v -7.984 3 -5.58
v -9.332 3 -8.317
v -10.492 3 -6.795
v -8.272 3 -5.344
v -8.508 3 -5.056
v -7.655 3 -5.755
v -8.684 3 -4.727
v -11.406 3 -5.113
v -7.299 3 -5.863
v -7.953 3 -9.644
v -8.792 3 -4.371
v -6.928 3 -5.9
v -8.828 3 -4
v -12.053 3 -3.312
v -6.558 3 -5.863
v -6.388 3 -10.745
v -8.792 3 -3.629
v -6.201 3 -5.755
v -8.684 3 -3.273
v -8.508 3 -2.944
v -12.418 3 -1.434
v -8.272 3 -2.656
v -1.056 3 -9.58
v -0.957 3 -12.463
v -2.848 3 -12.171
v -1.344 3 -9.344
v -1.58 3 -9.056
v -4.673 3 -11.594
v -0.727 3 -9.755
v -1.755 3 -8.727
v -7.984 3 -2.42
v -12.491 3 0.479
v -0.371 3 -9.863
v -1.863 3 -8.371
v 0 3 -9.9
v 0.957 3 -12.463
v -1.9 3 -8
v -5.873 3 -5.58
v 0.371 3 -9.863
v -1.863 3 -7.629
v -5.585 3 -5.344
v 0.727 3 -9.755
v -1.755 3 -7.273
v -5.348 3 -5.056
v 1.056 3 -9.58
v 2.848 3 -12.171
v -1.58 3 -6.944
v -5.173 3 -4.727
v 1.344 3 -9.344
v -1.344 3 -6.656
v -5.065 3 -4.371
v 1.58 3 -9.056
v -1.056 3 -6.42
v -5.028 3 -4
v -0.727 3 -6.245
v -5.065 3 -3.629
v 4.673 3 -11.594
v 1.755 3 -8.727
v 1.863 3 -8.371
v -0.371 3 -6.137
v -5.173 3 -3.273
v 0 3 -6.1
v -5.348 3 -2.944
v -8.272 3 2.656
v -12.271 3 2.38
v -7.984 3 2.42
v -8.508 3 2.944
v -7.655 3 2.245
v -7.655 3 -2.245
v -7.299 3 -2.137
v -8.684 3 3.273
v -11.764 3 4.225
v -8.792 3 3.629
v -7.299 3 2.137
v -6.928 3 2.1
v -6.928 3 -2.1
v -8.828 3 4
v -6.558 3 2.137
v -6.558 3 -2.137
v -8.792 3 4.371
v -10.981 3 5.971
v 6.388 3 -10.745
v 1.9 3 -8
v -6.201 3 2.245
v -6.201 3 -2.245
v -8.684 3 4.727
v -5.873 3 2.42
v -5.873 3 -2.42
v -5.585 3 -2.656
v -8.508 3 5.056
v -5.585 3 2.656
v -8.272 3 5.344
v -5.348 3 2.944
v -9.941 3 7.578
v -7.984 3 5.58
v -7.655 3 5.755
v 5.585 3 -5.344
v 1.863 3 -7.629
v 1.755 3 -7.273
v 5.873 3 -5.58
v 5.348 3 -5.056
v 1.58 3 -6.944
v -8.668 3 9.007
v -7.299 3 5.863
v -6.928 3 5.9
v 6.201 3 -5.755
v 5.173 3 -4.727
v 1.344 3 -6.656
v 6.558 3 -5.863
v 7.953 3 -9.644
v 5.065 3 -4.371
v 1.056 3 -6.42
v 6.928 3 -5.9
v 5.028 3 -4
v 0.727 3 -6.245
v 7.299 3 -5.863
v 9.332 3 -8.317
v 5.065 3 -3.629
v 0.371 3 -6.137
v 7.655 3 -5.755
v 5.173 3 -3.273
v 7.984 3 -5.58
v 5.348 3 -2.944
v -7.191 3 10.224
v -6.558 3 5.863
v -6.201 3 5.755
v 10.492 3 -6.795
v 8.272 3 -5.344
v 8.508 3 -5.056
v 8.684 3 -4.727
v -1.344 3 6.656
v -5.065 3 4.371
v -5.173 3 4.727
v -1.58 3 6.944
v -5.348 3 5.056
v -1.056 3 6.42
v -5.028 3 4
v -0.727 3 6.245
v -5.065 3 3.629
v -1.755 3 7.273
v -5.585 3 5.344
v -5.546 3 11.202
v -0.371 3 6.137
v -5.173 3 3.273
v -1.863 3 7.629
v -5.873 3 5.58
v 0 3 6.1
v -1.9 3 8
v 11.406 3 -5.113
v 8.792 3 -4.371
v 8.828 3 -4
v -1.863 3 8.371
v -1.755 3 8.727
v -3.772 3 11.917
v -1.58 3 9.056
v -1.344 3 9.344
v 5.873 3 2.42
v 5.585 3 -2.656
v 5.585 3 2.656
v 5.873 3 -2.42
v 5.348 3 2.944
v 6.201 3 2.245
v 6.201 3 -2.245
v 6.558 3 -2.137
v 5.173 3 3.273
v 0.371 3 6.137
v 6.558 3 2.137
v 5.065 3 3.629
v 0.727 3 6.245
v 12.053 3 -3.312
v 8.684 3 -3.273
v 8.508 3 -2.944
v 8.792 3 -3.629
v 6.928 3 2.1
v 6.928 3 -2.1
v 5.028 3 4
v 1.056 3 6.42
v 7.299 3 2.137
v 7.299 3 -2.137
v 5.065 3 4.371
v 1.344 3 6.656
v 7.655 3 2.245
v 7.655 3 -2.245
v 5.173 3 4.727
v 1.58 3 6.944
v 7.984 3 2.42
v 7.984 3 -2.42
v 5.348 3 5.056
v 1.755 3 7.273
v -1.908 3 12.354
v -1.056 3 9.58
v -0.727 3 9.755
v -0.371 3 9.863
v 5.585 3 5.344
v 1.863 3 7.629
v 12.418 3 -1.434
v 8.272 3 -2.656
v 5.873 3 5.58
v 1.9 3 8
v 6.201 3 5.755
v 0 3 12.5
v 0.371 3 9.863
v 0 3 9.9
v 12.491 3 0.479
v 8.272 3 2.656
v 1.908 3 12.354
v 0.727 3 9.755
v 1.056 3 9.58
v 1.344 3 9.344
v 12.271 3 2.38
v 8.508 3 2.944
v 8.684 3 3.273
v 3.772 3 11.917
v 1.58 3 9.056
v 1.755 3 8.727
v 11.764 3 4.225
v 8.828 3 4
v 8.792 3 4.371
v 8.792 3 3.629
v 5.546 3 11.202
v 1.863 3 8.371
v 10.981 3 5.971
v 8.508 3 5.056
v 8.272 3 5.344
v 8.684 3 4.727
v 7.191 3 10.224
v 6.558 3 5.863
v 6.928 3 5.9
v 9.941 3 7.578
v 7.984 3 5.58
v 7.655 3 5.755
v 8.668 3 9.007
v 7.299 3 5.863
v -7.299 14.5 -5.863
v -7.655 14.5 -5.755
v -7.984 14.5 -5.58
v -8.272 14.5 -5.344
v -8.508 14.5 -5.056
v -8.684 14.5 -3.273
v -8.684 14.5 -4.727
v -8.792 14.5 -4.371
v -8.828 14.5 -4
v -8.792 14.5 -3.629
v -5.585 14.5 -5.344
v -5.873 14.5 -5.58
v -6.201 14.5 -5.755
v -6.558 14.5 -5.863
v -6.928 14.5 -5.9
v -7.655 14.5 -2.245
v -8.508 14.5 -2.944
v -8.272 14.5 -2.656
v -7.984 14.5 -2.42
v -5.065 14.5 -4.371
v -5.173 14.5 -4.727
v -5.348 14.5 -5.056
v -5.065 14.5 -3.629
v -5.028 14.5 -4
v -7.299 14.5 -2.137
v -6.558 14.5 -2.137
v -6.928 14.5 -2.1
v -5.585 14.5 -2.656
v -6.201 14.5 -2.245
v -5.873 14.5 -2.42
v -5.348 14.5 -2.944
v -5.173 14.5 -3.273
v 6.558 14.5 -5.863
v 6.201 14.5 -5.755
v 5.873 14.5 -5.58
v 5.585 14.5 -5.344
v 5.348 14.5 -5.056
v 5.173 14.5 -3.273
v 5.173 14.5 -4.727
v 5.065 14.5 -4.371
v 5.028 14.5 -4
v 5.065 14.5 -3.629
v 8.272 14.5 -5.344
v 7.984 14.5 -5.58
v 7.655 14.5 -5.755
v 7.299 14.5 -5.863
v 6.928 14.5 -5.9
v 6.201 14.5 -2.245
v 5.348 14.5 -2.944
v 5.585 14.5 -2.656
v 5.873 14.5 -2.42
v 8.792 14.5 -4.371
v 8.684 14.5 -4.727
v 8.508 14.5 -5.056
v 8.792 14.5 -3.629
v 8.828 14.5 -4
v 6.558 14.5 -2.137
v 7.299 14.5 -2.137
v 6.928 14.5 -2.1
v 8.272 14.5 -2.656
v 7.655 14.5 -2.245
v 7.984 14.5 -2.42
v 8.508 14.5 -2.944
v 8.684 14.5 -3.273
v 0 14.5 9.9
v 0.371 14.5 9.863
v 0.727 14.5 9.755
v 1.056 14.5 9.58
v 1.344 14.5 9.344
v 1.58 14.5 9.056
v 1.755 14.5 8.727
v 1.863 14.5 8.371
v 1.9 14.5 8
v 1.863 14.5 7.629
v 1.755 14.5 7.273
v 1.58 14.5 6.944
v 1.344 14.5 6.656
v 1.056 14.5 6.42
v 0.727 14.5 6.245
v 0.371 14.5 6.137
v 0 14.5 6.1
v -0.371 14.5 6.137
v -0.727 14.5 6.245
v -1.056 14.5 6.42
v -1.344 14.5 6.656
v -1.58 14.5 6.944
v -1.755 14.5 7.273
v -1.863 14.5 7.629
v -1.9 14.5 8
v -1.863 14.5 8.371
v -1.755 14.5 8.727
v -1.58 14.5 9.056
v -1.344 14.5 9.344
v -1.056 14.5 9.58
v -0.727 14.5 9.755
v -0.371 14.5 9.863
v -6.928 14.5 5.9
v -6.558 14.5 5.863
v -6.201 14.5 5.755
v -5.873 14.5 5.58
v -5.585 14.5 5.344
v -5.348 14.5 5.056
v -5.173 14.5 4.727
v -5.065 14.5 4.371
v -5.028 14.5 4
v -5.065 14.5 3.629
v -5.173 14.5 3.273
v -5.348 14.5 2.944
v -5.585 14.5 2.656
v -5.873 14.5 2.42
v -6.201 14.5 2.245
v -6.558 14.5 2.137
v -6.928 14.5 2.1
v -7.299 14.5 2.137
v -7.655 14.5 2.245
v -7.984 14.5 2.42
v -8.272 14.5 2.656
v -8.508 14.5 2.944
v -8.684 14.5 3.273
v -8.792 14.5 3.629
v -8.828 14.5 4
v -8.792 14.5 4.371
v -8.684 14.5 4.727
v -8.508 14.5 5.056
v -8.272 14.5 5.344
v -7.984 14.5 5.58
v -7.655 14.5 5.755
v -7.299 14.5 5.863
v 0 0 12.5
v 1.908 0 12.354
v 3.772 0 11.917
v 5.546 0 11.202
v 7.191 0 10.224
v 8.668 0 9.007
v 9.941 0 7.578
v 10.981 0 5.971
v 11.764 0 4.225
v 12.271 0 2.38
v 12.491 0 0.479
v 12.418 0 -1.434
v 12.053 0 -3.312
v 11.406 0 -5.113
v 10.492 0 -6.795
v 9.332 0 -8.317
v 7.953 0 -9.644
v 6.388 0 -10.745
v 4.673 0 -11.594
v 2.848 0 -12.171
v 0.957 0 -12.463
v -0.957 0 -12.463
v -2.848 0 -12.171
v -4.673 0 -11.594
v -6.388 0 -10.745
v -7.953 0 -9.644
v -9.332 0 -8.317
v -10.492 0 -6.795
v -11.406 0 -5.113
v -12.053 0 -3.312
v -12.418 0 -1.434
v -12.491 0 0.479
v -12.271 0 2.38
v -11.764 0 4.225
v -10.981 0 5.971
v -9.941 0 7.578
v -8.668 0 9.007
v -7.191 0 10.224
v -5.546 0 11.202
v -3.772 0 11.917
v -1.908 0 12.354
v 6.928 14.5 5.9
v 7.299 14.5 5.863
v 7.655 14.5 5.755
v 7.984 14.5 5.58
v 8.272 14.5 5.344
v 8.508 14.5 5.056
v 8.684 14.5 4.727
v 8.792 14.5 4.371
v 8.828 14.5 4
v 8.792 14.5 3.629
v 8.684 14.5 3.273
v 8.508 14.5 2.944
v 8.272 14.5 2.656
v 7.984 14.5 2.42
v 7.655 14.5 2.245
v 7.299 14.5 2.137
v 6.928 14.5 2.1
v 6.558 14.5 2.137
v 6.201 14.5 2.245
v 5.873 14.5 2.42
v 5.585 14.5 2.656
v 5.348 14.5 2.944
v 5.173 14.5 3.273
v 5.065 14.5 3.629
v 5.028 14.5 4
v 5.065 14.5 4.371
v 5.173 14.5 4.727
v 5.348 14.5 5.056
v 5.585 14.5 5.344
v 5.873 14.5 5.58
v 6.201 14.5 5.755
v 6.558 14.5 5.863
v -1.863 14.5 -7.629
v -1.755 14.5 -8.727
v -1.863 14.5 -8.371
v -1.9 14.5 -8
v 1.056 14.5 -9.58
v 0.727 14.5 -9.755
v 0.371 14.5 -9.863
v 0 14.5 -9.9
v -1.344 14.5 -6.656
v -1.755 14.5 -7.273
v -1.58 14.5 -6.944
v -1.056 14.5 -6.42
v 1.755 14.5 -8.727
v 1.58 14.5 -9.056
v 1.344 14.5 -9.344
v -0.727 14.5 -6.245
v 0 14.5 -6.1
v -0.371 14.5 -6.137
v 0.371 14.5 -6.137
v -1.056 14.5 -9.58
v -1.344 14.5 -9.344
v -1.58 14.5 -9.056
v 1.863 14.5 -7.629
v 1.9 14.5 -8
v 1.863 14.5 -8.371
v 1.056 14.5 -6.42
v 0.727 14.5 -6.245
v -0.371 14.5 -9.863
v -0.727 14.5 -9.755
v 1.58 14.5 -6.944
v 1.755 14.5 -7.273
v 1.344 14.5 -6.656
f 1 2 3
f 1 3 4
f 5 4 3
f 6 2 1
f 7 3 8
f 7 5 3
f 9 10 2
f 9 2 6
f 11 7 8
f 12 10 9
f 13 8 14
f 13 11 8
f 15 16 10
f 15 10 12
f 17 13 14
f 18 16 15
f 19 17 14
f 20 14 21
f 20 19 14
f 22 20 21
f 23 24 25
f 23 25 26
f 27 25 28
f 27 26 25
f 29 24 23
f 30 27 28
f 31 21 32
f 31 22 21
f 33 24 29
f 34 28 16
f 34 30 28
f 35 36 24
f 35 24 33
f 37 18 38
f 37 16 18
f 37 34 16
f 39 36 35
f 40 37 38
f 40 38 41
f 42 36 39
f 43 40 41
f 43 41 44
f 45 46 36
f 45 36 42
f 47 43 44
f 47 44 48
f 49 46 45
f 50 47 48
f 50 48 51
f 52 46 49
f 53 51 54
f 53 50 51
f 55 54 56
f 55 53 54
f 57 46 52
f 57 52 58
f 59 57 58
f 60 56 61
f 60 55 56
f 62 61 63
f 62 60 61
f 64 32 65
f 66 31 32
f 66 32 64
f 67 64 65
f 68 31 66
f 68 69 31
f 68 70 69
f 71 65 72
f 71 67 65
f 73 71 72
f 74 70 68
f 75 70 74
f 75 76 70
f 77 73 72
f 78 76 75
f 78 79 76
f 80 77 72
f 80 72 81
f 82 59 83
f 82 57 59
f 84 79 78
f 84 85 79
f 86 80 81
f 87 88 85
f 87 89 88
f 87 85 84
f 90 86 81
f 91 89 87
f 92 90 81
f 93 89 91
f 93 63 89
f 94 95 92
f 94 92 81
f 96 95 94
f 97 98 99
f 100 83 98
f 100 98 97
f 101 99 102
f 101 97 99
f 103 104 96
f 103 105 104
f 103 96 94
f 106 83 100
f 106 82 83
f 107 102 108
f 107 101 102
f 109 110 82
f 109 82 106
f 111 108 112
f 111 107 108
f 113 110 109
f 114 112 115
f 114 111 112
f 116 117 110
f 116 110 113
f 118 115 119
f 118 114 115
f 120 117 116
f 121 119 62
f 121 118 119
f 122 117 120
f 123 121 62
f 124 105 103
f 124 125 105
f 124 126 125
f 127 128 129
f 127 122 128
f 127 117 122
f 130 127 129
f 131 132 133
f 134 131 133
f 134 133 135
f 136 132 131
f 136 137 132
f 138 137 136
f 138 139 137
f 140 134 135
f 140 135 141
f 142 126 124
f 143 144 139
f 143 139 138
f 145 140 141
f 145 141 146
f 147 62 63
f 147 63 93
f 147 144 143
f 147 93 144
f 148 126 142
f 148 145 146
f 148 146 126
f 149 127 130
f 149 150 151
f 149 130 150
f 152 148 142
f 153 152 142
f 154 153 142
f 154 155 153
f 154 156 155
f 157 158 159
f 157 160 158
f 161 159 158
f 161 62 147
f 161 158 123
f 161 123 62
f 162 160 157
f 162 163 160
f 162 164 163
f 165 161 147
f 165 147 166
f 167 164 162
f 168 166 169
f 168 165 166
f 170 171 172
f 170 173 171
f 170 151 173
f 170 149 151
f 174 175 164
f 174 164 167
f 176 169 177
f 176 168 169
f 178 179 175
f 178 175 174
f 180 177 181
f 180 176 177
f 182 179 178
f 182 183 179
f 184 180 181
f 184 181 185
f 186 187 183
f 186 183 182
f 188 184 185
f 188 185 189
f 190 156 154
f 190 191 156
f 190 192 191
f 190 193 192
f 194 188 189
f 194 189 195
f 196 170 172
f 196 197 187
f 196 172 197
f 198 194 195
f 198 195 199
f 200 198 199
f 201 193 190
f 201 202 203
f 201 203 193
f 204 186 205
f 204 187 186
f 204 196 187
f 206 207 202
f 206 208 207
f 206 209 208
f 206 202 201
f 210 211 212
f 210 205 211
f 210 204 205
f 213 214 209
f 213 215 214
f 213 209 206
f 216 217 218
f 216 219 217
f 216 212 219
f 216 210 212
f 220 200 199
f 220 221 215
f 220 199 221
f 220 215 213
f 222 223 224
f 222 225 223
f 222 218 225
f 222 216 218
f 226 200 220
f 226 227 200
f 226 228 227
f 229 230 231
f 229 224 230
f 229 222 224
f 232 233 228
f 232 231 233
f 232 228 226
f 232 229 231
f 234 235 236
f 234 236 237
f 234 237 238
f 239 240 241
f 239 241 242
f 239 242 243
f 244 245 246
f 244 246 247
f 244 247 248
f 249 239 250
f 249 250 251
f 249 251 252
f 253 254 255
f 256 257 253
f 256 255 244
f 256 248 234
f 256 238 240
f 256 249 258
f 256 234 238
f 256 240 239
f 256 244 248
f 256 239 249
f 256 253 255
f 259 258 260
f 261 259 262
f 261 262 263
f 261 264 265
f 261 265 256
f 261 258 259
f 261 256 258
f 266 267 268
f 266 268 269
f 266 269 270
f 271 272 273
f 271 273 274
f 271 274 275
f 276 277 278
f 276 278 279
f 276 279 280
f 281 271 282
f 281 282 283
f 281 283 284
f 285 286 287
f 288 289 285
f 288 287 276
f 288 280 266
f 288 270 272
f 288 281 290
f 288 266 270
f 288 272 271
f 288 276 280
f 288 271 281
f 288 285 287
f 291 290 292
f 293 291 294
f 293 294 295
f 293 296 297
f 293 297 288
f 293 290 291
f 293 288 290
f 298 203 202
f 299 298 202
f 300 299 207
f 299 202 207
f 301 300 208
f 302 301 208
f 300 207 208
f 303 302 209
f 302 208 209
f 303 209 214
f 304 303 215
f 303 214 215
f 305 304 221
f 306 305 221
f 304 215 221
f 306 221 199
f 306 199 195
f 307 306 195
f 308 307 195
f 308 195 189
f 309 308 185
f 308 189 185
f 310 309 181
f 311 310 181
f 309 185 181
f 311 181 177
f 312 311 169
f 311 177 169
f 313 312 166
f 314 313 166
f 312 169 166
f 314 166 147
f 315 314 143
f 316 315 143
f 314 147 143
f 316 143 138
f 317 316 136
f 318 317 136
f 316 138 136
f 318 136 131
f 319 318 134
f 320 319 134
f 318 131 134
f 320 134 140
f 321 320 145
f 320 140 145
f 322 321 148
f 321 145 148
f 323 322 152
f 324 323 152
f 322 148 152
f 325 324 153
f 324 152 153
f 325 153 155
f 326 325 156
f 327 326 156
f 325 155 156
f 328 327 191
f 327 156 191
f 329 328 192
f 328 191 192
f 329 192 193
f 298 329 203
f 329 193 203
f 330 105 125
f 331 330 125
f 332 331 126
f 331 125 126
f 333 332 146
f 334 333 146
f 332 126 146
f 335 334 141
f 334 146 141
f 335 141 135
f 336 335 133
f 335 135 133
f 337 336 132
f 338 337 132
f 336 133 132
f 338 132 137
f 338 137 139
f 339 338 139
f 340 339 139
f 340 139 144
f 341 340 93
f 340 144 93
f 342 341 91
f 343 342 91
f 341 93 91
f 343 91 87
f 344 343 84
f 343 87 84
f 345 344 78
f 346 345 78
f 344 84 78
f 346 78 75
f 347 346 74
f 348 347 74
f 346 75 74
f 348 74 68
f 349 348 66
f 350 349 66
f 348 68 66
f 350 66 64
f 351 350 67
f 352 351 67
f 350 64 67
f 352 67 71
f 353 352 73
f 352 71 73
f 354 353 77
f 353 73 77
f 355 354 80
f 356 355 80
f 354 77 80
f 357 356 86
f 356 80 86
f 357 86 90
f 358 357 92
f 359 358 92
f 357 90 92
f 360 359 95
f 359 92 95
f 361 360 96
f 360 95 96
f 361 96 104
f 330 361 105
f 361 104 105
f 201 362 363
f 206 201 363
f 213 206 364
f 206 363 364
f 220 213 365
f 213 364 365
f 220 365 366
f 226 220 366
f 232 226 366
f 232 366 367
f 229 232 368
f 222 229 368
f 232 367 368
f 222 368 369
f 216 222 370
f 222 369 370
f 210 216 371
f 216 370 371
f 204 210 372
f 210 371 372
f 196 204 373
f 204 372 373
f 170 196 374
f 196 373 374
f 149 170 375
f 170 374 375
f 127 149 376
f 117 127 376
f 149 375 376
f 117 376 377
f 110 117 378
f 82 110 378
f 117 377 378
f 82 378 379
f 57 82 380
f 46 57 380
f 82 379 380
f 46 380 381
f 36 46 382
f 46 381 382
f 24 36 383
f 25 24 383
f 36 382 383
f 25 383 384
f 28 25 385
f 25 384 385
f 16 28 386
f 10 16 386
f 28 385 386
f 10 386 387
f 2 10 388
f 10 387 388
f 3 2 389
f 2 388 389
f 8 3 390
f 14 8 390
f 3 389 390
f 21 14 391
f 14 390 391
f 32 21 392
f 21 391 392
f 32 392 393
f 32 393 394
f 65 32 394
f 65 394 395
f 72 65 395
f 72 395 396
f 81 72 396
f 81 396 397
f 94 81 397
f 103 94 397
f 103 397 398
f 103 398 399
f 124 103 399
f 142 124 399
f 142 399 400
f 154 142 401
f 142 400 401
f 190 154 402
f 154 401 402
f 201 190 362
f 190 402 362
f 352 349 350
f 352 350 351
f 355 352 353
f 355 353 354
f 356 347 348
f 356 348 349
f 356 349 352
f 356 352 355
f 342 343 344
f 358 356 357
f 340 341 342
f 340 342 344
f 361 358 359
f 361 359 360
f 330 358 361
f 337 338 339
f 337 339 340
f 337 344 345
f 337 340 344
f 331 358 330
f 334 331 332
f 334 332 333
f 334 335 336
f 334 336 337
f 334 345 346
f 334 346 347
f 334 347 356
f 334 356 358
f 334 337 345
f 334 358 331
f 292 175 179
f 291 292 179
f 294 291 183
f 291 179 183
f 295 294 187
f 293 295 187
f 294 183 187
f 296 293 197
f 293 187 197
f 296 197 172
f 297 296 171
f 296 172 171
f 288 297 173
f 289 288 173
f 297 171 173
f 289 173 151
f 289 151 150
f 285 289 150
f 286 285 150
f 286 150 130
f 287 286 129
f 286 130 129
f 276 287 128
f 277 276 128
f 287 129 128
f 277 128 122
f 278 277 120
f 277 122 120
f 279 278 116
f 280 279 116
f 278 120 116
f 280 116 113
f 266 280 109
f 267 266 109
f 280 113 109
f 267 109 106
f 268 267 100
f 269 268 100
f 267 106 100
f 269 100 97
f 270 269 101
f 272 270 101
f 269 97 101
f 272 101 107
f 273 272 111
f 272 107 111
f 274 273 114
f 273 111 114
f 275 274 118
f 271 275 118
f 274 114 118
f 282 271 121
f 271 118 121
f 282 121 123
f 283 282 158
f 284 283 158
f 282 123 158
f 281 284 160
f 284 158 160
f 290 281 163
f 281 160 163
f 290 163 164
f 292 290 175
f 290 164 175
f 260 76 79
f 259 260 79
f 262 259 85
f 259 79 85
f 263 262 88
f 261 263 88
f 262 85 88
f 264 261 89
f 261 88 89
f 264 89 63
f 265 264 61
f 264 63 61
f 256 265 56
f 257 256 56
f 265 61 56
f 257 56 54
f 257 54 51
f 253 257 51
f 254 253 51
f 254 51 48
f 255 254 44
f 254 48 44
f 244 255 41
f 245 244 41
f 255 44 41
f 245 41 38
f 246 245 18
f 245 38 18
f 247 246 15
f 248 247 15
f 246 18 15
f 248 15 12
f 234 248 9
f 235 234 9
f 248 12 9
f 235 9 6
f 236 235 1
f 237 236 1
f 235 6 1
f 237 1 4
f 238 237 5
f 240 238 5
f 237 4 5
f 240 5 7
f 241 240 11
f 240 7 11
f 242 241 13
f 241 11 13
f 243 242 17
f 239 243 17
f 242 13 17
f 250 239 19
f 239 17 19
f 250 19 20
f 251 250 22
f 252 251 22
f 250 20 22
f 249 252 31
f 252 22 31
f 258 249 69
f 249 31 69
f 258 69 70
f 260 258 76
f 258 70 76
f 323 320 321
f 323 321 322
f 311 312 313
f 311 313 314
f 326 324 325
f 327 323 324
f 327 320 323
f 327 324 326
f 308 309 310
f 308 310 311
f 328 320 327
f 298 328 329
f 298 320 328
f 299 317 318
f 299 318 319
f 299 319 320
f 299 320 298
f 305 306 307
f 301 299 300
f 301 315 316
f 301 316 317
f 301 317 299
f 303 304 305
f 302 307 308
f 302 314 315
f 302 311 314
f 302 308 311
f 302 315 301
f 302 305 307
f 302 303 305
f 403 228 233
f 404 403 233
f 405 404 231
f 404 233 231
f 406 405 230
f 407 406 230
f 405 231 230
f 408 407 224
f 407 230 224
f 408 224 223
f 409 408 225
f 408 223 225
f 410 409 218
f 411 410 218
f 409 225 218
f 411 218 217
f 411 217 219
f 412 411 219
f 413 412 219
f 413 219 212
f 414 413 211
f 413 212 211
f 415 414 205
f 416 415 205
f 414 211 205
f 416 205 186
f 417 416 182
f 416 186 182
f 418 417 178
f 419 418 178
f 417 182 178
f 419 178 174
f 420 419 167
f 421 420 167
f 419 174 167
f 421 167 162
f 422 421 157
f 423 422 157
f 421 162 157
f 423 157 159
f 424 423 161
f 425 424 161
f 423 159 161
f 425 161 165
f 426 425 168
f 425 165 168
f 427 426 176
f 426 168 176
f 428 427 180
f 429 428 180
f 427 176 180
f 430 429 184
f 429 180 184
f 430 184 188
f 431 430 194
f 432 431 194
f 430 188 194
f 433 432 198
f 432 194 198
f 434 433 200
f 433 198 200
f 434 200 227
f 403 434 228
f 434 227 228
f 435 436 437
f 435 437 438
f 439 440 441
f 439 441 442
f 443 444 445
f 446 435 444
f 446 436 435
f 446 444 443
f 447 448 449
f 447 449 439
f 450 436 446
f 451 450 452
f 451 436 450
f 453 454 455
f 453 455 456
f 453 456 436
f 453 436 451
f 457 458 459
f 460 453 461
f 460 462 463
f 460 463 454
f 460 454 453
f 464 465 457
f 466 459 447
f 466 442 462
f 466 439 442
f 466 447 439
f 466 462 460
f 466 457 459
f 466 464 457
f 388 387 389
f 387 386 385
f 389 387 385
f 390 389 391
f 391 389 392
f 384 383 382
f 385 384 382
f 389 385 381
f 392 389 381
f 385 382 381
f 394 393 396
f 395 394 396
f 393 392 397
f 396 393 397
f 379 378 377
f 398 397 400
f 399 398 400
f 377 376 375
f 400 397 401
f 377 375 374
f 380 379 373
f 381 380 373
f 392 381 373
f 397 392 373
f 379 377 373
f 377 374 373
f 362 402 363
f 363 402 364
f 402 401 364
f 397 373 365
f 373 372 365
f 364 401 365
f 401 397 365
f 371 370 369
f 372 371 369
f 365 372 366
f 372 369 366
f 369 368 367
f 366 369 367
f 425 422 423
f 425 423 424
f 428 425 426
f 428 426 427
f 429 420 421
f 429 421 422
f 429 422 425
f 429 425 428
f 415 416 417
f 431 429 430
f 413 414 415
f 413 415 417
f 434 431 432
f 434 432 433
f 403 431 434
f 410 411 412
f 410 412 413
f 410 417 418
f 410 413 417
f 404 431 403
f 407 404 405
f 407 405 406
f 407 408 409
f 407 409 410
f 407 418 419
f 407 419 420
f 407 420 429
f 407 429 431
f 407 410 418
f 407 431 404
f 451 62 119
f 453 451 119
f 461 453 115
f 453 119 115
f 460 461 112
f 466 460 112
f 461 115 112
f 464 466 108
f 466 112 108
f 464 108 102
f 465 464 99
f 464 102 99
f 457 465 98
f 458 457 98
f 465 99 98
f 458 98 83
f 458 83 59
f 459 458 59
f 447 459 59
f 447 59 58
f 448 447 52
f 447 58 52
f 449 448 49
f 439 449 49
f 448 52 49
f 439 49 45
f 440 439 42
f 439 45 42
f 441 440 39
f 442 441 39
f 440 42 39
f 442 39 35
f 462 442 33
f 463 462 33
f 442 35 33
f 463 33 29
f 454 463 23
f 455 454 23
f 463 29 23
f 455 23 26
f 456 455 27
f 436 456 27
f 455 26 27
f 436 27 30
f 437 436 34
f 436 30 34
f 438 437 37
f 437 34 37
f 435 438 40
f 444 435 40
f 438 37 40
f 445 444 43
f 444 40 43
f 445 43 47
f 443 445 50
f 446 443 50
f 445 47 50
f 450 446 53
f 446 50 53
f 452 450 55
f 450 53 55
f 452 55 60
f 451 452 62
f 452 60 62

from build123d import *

# Parameters (mm, degrees)
SKETCH_2_R      = 12.5
EXTRUDE_1_DEPTH = 3
SKETCH_3_R      = 1.9
EXTRUDE_2_DEPTH = 11.5


with BuildPart() as part:
    # 草图2 → 凸台-拉伸1 (new body)
    with BuildSketch(Plane(origin=(0, 0, 0), x_dir=(1, 0, 0), z_dir=(0, 1, 0))):
        with Locations(Location((0, 0, 0), (0, 0, 270))):
            Circle(SKETCH_2_R)
    extrude(amount=EXTRUDE_1_DEPTH)

    # 草图3 → 凸台-拉伸2 (add)
    with BuildSketch(Plane(origin=(0, 3, 0), x_dir=(1, 0, 0), z_dir=(0, 1, 0))):
        with Locations(Location((0, 8, 0), (0, 0, 270))):
            Circle(SKETCH_3_R)
        with Locations(Location((6.92820323, 4, 0), (0, 0, 270))):
            Circle(SKETCH_3_R)
        with Locations(Location((6.92820323, -4, 0), (0, 0, 270))):
            Circle(SKETCH_3_R)
        with Locations(Location((0, -8, 0), (0, 0, 270))):
            Circle(SKETCH_3_R)
        with Locations(Location((-6.92820323, -4, 0), (0, 0, 270))):
            Circle(SKETCH_3_R)
        with Locations(Location((-6.92820323, 4, 0), (0, 0, 270))):
            Circle(SKETCH_3_R)
    extrude(amount=EXTRUDE_2_DEPTH)


solid = part.part
